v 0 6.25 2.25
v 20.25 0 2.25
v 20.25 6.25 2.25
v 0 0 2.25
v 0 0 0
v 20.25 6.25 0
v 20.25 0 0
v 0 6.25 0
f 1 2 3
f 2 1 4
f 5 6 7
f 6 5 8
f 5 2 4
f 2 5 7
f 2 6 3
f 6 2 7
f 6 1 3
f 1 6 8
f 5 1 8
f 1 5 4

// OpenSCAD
width = 20.25;
height = 6.25;
length = 2.25;

cube([width, height, length]);
